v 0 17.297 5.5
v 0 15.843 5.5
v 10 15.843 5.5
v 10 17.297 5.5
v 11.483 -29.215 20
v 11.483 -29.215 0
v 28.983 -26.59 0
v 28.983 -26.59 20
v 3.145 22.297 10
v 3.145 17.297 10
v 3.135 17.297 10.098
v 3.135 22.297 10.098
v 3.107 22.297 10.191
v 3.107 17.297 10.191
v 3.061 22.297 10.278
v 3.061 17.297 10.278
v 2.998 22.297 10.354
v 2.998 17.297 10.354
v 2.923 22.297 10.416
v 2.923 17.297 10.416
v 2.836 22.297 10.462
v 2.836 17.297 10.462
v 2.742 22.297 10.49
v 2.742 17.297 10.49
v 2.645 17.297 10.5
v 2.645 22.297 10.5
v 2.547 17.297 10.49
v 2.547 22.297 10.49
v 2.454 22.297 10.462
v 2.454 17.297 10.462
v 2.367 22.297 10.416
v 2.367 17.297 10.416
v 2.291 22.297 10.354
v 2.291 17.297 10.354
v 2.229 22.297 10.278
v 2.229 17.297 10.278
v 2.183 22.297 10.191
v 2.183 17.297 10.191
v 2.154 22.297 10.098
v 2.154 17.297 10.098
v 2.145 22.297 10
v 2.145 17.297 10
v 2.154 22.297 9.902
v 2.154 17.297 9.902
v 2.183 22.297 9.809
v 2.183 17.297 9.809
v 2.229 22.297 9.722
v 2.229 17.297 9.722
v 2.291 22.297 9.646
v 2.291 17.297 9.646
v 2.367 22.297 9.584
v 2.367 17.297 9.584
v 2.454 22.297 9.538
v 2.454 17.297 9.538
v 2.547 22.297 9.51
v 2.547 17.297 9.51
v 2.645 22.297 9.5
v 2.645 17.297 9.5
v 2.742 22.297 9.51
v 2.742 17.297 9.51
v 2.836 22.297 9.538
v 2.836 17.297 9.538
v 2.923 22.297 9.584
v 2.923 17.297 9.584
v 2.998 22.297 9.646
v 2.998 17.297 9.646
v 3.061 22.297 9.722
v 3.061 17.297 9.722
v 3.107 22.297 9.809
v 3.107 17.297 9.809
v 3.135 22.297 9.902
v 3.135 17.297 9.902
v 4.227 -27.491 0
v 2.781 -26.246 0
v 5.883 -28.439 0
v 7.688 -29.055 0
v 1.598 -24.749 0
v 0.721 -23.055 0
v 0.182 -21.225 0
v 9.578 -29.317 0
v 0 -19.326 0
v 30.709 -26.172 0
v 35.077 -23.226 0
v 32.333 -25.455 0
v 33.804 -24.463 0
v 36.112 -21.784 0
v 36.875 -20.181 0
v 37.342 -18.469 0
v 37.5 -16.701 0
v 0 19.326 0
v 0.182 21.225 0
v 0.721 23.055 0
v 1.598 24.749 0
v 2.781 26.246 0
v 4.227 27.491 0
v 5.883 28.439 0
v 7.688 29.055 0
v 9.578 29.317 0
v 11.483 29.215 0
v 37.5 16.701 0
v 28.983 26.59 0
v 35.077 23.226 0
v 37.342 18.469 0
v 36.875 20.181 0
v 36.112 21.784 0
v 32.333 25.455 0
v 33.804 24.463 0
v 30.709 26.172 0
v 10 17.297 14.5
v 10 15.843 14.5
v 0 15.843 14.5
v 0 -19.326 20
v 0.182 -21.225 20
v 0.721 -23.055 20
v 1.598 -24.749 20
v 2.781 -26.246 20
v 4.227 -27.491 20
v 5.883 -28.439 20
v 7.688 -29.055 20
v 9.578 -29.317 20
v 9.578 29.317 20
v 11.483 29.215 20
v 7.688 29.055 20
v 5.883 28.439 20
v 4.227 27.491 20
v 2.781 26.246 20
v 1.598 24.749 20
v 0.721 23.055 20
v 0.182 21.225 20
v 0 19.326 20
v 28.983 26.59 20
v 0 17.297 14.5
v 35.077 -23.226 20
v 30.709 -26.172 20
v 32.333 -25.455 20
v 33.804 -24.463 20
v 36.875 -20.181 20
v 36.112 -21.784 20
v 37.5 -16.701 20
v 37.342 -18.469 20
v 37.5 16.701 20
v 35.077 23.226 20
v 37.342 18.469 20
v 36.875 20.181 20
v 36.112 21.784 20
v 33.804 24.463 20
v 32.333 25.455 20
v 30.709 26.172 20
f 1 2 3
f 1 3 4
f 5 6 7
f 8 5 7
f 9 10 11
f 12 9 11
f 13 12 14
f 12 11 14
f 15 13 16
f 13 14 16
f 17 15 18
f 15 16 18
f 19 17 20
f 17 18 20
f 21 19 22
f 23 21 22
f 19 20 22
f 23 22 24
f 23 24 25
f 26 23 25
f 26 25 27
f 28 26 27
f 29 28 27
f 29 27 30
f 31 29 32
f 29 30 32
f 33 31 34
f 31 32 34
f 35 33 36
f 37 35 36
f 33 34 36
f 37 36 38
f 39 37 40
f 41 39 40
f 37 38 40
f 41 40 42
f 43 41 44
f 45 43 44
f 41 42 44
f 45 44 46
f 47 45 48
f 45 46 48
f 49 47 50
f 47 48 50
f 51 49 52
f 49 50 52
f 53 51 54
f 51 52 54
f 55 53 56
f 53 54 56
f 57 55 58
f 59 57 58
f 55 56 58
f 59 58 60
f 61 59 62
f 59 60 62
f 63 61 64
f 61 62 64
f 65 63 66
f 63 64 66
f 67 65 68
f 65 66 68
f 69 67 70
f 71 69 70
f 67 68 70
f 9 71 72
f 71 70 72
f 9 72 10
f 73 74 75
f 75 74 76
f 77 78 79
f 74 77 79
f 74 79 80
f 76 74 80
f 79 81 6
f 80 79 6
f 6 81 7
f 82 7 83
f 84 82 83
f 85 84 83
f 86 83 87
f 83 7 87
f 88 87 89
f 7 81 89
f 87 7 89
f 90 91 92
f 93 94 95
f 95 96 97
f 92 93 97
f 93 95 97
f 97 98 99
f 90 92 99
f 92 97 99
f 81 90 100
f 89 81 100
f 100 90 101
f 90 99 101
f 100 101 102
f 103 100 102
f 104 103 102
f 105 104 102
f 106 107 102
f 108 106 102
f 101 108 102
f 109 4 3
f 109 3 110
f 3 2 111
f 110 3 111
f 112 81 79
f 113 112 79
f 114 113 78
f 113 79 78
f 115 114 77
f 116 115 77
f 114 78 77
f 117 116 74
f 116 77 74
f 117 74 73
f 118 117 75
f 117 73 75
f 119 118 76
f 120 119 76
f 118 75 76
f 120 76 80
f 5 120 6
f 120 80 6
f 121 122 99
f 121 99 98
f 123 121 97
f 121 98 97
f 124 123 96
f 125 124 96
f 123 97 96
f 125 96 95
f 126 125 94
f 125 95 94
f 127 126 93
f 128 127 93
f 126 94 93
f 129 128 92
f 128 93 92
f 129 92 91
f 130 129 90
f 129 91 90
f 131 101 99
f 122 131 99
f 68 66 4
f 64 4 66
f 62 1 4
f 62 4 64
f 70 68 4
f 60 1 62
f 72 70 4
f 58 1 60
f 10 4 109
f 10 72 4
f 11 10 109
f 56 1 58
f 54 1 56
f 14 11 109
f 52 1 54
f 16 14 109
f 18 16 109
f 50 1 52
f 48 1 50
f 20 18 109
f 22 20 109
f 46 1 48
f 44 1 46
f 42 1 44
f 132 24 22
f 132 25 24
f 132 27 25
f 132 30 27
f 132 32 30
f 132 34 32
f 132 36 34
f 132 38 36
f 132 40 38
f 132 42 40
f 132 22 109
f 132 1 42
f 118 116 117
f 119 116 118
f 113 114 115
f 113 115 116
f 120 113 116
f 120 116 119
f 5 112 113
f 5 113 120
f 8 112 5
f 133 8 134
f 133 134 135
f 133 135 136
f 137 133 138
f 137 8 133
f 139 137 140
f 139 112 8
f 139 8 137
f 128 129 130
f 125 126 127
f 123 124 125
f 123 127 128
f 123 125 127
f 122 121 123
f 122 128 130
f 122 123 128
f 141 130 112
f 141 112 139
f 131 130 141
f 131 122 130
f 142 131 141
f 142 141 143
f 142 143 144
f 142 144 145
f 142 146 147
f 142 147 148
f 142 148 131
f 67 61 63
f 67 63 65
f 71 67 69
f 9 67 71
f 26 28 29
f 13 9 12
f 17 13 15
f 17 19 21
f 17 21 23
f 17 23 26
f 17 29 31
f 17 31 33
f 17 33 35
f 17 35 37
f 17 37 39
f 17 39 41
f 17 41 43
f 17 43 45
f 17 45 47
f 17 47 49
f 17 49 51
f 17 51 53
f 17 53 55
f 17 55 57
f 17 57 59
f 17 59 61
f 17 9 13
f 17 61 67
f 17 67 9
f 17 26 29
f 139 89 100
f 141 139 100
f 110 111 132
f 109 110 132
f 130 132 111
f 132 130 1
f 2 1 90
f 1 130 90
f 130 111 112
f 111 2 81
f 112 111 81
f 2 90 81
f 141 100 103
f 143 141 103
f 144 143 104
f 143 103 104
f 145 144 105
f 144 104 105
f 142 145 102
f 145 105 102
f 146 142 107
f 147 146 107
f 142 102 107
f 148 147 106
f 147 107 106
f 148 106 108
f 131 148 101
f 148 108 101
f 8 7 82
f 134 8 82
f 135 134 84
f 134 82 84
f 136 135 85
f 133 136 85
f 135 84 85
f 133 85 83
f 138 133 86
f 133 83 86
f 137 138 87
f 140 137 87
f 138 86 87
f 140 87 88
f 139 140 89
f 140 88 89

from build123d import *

# Parameters (mm, degrees)
BOSS_EXTRUDE1_DEPTH = 20
SKETCH5_W           = 9
SKETCH5_H           = 1.454272164
CUT_EXTRUDE4_DEPTH  = 10
SKETCH6_R           = 0.5
CUT_EXTRUDE5_DEPTH  = 5


with BuildPart() as part:
    # Sketch1 → Boss-Extrude1 (new body)
    with BuildSketch(Plane.XY):
        with BuildLine():
            Line((0, 19.325625792), (0, -19.325625792))
            ThreePointArc((0, -19.325625792), (3.474436626, -26.903027896), (11.483404529, -29.214989321))
            Line((11.483404529, -29.214989321), (28.983404529, -26.589989321))
            ThreePointArc((28.983404529, -26.589989321), (35.077402104, -23.226189166), (37.5, -16.700625792))
            Line((37.5, -16.700625792), (37.5, 16.700625792))
            ThreePointArc((37.5, 16.700625792), (35.077402104, 23.226189166), (28.983404529, 26.589989321))
            Line((28.983404529, 26.589989321), (11.483404529, 29.214989321))
            ThreePointArc((11.483404529, 29.214989321), (3.474436626, 26.903027896), (0, 19.325625792))
        make_face()
    extrude(amount=BOSS_EXTRUDE1_DEPTH)

    # Sketch5 → Cut-Extrude4 (cut)
    with BuildSketch(Plane.ZY):
        with Locations((10, 16.569972364)):
            Rectangle(SKETCH5_W, SKETCH5_H)
    extrude(amount=-CUT_EXTRUDE4_DEPTH, mode=Mode.SUBTRACT)

    # Sketch6 → Cut-Extrude5 (cut)
    with BuildSketch(Plane.XZ.offset(-17.297108446)):
        with Locations((2.644871575, 10)):
            Circle(SKETCH6_R)
    extrude(amount=-CUT_EXTRUDE5_DEPTH, mode=Mode.SUBTRACT)


solid = part.part
